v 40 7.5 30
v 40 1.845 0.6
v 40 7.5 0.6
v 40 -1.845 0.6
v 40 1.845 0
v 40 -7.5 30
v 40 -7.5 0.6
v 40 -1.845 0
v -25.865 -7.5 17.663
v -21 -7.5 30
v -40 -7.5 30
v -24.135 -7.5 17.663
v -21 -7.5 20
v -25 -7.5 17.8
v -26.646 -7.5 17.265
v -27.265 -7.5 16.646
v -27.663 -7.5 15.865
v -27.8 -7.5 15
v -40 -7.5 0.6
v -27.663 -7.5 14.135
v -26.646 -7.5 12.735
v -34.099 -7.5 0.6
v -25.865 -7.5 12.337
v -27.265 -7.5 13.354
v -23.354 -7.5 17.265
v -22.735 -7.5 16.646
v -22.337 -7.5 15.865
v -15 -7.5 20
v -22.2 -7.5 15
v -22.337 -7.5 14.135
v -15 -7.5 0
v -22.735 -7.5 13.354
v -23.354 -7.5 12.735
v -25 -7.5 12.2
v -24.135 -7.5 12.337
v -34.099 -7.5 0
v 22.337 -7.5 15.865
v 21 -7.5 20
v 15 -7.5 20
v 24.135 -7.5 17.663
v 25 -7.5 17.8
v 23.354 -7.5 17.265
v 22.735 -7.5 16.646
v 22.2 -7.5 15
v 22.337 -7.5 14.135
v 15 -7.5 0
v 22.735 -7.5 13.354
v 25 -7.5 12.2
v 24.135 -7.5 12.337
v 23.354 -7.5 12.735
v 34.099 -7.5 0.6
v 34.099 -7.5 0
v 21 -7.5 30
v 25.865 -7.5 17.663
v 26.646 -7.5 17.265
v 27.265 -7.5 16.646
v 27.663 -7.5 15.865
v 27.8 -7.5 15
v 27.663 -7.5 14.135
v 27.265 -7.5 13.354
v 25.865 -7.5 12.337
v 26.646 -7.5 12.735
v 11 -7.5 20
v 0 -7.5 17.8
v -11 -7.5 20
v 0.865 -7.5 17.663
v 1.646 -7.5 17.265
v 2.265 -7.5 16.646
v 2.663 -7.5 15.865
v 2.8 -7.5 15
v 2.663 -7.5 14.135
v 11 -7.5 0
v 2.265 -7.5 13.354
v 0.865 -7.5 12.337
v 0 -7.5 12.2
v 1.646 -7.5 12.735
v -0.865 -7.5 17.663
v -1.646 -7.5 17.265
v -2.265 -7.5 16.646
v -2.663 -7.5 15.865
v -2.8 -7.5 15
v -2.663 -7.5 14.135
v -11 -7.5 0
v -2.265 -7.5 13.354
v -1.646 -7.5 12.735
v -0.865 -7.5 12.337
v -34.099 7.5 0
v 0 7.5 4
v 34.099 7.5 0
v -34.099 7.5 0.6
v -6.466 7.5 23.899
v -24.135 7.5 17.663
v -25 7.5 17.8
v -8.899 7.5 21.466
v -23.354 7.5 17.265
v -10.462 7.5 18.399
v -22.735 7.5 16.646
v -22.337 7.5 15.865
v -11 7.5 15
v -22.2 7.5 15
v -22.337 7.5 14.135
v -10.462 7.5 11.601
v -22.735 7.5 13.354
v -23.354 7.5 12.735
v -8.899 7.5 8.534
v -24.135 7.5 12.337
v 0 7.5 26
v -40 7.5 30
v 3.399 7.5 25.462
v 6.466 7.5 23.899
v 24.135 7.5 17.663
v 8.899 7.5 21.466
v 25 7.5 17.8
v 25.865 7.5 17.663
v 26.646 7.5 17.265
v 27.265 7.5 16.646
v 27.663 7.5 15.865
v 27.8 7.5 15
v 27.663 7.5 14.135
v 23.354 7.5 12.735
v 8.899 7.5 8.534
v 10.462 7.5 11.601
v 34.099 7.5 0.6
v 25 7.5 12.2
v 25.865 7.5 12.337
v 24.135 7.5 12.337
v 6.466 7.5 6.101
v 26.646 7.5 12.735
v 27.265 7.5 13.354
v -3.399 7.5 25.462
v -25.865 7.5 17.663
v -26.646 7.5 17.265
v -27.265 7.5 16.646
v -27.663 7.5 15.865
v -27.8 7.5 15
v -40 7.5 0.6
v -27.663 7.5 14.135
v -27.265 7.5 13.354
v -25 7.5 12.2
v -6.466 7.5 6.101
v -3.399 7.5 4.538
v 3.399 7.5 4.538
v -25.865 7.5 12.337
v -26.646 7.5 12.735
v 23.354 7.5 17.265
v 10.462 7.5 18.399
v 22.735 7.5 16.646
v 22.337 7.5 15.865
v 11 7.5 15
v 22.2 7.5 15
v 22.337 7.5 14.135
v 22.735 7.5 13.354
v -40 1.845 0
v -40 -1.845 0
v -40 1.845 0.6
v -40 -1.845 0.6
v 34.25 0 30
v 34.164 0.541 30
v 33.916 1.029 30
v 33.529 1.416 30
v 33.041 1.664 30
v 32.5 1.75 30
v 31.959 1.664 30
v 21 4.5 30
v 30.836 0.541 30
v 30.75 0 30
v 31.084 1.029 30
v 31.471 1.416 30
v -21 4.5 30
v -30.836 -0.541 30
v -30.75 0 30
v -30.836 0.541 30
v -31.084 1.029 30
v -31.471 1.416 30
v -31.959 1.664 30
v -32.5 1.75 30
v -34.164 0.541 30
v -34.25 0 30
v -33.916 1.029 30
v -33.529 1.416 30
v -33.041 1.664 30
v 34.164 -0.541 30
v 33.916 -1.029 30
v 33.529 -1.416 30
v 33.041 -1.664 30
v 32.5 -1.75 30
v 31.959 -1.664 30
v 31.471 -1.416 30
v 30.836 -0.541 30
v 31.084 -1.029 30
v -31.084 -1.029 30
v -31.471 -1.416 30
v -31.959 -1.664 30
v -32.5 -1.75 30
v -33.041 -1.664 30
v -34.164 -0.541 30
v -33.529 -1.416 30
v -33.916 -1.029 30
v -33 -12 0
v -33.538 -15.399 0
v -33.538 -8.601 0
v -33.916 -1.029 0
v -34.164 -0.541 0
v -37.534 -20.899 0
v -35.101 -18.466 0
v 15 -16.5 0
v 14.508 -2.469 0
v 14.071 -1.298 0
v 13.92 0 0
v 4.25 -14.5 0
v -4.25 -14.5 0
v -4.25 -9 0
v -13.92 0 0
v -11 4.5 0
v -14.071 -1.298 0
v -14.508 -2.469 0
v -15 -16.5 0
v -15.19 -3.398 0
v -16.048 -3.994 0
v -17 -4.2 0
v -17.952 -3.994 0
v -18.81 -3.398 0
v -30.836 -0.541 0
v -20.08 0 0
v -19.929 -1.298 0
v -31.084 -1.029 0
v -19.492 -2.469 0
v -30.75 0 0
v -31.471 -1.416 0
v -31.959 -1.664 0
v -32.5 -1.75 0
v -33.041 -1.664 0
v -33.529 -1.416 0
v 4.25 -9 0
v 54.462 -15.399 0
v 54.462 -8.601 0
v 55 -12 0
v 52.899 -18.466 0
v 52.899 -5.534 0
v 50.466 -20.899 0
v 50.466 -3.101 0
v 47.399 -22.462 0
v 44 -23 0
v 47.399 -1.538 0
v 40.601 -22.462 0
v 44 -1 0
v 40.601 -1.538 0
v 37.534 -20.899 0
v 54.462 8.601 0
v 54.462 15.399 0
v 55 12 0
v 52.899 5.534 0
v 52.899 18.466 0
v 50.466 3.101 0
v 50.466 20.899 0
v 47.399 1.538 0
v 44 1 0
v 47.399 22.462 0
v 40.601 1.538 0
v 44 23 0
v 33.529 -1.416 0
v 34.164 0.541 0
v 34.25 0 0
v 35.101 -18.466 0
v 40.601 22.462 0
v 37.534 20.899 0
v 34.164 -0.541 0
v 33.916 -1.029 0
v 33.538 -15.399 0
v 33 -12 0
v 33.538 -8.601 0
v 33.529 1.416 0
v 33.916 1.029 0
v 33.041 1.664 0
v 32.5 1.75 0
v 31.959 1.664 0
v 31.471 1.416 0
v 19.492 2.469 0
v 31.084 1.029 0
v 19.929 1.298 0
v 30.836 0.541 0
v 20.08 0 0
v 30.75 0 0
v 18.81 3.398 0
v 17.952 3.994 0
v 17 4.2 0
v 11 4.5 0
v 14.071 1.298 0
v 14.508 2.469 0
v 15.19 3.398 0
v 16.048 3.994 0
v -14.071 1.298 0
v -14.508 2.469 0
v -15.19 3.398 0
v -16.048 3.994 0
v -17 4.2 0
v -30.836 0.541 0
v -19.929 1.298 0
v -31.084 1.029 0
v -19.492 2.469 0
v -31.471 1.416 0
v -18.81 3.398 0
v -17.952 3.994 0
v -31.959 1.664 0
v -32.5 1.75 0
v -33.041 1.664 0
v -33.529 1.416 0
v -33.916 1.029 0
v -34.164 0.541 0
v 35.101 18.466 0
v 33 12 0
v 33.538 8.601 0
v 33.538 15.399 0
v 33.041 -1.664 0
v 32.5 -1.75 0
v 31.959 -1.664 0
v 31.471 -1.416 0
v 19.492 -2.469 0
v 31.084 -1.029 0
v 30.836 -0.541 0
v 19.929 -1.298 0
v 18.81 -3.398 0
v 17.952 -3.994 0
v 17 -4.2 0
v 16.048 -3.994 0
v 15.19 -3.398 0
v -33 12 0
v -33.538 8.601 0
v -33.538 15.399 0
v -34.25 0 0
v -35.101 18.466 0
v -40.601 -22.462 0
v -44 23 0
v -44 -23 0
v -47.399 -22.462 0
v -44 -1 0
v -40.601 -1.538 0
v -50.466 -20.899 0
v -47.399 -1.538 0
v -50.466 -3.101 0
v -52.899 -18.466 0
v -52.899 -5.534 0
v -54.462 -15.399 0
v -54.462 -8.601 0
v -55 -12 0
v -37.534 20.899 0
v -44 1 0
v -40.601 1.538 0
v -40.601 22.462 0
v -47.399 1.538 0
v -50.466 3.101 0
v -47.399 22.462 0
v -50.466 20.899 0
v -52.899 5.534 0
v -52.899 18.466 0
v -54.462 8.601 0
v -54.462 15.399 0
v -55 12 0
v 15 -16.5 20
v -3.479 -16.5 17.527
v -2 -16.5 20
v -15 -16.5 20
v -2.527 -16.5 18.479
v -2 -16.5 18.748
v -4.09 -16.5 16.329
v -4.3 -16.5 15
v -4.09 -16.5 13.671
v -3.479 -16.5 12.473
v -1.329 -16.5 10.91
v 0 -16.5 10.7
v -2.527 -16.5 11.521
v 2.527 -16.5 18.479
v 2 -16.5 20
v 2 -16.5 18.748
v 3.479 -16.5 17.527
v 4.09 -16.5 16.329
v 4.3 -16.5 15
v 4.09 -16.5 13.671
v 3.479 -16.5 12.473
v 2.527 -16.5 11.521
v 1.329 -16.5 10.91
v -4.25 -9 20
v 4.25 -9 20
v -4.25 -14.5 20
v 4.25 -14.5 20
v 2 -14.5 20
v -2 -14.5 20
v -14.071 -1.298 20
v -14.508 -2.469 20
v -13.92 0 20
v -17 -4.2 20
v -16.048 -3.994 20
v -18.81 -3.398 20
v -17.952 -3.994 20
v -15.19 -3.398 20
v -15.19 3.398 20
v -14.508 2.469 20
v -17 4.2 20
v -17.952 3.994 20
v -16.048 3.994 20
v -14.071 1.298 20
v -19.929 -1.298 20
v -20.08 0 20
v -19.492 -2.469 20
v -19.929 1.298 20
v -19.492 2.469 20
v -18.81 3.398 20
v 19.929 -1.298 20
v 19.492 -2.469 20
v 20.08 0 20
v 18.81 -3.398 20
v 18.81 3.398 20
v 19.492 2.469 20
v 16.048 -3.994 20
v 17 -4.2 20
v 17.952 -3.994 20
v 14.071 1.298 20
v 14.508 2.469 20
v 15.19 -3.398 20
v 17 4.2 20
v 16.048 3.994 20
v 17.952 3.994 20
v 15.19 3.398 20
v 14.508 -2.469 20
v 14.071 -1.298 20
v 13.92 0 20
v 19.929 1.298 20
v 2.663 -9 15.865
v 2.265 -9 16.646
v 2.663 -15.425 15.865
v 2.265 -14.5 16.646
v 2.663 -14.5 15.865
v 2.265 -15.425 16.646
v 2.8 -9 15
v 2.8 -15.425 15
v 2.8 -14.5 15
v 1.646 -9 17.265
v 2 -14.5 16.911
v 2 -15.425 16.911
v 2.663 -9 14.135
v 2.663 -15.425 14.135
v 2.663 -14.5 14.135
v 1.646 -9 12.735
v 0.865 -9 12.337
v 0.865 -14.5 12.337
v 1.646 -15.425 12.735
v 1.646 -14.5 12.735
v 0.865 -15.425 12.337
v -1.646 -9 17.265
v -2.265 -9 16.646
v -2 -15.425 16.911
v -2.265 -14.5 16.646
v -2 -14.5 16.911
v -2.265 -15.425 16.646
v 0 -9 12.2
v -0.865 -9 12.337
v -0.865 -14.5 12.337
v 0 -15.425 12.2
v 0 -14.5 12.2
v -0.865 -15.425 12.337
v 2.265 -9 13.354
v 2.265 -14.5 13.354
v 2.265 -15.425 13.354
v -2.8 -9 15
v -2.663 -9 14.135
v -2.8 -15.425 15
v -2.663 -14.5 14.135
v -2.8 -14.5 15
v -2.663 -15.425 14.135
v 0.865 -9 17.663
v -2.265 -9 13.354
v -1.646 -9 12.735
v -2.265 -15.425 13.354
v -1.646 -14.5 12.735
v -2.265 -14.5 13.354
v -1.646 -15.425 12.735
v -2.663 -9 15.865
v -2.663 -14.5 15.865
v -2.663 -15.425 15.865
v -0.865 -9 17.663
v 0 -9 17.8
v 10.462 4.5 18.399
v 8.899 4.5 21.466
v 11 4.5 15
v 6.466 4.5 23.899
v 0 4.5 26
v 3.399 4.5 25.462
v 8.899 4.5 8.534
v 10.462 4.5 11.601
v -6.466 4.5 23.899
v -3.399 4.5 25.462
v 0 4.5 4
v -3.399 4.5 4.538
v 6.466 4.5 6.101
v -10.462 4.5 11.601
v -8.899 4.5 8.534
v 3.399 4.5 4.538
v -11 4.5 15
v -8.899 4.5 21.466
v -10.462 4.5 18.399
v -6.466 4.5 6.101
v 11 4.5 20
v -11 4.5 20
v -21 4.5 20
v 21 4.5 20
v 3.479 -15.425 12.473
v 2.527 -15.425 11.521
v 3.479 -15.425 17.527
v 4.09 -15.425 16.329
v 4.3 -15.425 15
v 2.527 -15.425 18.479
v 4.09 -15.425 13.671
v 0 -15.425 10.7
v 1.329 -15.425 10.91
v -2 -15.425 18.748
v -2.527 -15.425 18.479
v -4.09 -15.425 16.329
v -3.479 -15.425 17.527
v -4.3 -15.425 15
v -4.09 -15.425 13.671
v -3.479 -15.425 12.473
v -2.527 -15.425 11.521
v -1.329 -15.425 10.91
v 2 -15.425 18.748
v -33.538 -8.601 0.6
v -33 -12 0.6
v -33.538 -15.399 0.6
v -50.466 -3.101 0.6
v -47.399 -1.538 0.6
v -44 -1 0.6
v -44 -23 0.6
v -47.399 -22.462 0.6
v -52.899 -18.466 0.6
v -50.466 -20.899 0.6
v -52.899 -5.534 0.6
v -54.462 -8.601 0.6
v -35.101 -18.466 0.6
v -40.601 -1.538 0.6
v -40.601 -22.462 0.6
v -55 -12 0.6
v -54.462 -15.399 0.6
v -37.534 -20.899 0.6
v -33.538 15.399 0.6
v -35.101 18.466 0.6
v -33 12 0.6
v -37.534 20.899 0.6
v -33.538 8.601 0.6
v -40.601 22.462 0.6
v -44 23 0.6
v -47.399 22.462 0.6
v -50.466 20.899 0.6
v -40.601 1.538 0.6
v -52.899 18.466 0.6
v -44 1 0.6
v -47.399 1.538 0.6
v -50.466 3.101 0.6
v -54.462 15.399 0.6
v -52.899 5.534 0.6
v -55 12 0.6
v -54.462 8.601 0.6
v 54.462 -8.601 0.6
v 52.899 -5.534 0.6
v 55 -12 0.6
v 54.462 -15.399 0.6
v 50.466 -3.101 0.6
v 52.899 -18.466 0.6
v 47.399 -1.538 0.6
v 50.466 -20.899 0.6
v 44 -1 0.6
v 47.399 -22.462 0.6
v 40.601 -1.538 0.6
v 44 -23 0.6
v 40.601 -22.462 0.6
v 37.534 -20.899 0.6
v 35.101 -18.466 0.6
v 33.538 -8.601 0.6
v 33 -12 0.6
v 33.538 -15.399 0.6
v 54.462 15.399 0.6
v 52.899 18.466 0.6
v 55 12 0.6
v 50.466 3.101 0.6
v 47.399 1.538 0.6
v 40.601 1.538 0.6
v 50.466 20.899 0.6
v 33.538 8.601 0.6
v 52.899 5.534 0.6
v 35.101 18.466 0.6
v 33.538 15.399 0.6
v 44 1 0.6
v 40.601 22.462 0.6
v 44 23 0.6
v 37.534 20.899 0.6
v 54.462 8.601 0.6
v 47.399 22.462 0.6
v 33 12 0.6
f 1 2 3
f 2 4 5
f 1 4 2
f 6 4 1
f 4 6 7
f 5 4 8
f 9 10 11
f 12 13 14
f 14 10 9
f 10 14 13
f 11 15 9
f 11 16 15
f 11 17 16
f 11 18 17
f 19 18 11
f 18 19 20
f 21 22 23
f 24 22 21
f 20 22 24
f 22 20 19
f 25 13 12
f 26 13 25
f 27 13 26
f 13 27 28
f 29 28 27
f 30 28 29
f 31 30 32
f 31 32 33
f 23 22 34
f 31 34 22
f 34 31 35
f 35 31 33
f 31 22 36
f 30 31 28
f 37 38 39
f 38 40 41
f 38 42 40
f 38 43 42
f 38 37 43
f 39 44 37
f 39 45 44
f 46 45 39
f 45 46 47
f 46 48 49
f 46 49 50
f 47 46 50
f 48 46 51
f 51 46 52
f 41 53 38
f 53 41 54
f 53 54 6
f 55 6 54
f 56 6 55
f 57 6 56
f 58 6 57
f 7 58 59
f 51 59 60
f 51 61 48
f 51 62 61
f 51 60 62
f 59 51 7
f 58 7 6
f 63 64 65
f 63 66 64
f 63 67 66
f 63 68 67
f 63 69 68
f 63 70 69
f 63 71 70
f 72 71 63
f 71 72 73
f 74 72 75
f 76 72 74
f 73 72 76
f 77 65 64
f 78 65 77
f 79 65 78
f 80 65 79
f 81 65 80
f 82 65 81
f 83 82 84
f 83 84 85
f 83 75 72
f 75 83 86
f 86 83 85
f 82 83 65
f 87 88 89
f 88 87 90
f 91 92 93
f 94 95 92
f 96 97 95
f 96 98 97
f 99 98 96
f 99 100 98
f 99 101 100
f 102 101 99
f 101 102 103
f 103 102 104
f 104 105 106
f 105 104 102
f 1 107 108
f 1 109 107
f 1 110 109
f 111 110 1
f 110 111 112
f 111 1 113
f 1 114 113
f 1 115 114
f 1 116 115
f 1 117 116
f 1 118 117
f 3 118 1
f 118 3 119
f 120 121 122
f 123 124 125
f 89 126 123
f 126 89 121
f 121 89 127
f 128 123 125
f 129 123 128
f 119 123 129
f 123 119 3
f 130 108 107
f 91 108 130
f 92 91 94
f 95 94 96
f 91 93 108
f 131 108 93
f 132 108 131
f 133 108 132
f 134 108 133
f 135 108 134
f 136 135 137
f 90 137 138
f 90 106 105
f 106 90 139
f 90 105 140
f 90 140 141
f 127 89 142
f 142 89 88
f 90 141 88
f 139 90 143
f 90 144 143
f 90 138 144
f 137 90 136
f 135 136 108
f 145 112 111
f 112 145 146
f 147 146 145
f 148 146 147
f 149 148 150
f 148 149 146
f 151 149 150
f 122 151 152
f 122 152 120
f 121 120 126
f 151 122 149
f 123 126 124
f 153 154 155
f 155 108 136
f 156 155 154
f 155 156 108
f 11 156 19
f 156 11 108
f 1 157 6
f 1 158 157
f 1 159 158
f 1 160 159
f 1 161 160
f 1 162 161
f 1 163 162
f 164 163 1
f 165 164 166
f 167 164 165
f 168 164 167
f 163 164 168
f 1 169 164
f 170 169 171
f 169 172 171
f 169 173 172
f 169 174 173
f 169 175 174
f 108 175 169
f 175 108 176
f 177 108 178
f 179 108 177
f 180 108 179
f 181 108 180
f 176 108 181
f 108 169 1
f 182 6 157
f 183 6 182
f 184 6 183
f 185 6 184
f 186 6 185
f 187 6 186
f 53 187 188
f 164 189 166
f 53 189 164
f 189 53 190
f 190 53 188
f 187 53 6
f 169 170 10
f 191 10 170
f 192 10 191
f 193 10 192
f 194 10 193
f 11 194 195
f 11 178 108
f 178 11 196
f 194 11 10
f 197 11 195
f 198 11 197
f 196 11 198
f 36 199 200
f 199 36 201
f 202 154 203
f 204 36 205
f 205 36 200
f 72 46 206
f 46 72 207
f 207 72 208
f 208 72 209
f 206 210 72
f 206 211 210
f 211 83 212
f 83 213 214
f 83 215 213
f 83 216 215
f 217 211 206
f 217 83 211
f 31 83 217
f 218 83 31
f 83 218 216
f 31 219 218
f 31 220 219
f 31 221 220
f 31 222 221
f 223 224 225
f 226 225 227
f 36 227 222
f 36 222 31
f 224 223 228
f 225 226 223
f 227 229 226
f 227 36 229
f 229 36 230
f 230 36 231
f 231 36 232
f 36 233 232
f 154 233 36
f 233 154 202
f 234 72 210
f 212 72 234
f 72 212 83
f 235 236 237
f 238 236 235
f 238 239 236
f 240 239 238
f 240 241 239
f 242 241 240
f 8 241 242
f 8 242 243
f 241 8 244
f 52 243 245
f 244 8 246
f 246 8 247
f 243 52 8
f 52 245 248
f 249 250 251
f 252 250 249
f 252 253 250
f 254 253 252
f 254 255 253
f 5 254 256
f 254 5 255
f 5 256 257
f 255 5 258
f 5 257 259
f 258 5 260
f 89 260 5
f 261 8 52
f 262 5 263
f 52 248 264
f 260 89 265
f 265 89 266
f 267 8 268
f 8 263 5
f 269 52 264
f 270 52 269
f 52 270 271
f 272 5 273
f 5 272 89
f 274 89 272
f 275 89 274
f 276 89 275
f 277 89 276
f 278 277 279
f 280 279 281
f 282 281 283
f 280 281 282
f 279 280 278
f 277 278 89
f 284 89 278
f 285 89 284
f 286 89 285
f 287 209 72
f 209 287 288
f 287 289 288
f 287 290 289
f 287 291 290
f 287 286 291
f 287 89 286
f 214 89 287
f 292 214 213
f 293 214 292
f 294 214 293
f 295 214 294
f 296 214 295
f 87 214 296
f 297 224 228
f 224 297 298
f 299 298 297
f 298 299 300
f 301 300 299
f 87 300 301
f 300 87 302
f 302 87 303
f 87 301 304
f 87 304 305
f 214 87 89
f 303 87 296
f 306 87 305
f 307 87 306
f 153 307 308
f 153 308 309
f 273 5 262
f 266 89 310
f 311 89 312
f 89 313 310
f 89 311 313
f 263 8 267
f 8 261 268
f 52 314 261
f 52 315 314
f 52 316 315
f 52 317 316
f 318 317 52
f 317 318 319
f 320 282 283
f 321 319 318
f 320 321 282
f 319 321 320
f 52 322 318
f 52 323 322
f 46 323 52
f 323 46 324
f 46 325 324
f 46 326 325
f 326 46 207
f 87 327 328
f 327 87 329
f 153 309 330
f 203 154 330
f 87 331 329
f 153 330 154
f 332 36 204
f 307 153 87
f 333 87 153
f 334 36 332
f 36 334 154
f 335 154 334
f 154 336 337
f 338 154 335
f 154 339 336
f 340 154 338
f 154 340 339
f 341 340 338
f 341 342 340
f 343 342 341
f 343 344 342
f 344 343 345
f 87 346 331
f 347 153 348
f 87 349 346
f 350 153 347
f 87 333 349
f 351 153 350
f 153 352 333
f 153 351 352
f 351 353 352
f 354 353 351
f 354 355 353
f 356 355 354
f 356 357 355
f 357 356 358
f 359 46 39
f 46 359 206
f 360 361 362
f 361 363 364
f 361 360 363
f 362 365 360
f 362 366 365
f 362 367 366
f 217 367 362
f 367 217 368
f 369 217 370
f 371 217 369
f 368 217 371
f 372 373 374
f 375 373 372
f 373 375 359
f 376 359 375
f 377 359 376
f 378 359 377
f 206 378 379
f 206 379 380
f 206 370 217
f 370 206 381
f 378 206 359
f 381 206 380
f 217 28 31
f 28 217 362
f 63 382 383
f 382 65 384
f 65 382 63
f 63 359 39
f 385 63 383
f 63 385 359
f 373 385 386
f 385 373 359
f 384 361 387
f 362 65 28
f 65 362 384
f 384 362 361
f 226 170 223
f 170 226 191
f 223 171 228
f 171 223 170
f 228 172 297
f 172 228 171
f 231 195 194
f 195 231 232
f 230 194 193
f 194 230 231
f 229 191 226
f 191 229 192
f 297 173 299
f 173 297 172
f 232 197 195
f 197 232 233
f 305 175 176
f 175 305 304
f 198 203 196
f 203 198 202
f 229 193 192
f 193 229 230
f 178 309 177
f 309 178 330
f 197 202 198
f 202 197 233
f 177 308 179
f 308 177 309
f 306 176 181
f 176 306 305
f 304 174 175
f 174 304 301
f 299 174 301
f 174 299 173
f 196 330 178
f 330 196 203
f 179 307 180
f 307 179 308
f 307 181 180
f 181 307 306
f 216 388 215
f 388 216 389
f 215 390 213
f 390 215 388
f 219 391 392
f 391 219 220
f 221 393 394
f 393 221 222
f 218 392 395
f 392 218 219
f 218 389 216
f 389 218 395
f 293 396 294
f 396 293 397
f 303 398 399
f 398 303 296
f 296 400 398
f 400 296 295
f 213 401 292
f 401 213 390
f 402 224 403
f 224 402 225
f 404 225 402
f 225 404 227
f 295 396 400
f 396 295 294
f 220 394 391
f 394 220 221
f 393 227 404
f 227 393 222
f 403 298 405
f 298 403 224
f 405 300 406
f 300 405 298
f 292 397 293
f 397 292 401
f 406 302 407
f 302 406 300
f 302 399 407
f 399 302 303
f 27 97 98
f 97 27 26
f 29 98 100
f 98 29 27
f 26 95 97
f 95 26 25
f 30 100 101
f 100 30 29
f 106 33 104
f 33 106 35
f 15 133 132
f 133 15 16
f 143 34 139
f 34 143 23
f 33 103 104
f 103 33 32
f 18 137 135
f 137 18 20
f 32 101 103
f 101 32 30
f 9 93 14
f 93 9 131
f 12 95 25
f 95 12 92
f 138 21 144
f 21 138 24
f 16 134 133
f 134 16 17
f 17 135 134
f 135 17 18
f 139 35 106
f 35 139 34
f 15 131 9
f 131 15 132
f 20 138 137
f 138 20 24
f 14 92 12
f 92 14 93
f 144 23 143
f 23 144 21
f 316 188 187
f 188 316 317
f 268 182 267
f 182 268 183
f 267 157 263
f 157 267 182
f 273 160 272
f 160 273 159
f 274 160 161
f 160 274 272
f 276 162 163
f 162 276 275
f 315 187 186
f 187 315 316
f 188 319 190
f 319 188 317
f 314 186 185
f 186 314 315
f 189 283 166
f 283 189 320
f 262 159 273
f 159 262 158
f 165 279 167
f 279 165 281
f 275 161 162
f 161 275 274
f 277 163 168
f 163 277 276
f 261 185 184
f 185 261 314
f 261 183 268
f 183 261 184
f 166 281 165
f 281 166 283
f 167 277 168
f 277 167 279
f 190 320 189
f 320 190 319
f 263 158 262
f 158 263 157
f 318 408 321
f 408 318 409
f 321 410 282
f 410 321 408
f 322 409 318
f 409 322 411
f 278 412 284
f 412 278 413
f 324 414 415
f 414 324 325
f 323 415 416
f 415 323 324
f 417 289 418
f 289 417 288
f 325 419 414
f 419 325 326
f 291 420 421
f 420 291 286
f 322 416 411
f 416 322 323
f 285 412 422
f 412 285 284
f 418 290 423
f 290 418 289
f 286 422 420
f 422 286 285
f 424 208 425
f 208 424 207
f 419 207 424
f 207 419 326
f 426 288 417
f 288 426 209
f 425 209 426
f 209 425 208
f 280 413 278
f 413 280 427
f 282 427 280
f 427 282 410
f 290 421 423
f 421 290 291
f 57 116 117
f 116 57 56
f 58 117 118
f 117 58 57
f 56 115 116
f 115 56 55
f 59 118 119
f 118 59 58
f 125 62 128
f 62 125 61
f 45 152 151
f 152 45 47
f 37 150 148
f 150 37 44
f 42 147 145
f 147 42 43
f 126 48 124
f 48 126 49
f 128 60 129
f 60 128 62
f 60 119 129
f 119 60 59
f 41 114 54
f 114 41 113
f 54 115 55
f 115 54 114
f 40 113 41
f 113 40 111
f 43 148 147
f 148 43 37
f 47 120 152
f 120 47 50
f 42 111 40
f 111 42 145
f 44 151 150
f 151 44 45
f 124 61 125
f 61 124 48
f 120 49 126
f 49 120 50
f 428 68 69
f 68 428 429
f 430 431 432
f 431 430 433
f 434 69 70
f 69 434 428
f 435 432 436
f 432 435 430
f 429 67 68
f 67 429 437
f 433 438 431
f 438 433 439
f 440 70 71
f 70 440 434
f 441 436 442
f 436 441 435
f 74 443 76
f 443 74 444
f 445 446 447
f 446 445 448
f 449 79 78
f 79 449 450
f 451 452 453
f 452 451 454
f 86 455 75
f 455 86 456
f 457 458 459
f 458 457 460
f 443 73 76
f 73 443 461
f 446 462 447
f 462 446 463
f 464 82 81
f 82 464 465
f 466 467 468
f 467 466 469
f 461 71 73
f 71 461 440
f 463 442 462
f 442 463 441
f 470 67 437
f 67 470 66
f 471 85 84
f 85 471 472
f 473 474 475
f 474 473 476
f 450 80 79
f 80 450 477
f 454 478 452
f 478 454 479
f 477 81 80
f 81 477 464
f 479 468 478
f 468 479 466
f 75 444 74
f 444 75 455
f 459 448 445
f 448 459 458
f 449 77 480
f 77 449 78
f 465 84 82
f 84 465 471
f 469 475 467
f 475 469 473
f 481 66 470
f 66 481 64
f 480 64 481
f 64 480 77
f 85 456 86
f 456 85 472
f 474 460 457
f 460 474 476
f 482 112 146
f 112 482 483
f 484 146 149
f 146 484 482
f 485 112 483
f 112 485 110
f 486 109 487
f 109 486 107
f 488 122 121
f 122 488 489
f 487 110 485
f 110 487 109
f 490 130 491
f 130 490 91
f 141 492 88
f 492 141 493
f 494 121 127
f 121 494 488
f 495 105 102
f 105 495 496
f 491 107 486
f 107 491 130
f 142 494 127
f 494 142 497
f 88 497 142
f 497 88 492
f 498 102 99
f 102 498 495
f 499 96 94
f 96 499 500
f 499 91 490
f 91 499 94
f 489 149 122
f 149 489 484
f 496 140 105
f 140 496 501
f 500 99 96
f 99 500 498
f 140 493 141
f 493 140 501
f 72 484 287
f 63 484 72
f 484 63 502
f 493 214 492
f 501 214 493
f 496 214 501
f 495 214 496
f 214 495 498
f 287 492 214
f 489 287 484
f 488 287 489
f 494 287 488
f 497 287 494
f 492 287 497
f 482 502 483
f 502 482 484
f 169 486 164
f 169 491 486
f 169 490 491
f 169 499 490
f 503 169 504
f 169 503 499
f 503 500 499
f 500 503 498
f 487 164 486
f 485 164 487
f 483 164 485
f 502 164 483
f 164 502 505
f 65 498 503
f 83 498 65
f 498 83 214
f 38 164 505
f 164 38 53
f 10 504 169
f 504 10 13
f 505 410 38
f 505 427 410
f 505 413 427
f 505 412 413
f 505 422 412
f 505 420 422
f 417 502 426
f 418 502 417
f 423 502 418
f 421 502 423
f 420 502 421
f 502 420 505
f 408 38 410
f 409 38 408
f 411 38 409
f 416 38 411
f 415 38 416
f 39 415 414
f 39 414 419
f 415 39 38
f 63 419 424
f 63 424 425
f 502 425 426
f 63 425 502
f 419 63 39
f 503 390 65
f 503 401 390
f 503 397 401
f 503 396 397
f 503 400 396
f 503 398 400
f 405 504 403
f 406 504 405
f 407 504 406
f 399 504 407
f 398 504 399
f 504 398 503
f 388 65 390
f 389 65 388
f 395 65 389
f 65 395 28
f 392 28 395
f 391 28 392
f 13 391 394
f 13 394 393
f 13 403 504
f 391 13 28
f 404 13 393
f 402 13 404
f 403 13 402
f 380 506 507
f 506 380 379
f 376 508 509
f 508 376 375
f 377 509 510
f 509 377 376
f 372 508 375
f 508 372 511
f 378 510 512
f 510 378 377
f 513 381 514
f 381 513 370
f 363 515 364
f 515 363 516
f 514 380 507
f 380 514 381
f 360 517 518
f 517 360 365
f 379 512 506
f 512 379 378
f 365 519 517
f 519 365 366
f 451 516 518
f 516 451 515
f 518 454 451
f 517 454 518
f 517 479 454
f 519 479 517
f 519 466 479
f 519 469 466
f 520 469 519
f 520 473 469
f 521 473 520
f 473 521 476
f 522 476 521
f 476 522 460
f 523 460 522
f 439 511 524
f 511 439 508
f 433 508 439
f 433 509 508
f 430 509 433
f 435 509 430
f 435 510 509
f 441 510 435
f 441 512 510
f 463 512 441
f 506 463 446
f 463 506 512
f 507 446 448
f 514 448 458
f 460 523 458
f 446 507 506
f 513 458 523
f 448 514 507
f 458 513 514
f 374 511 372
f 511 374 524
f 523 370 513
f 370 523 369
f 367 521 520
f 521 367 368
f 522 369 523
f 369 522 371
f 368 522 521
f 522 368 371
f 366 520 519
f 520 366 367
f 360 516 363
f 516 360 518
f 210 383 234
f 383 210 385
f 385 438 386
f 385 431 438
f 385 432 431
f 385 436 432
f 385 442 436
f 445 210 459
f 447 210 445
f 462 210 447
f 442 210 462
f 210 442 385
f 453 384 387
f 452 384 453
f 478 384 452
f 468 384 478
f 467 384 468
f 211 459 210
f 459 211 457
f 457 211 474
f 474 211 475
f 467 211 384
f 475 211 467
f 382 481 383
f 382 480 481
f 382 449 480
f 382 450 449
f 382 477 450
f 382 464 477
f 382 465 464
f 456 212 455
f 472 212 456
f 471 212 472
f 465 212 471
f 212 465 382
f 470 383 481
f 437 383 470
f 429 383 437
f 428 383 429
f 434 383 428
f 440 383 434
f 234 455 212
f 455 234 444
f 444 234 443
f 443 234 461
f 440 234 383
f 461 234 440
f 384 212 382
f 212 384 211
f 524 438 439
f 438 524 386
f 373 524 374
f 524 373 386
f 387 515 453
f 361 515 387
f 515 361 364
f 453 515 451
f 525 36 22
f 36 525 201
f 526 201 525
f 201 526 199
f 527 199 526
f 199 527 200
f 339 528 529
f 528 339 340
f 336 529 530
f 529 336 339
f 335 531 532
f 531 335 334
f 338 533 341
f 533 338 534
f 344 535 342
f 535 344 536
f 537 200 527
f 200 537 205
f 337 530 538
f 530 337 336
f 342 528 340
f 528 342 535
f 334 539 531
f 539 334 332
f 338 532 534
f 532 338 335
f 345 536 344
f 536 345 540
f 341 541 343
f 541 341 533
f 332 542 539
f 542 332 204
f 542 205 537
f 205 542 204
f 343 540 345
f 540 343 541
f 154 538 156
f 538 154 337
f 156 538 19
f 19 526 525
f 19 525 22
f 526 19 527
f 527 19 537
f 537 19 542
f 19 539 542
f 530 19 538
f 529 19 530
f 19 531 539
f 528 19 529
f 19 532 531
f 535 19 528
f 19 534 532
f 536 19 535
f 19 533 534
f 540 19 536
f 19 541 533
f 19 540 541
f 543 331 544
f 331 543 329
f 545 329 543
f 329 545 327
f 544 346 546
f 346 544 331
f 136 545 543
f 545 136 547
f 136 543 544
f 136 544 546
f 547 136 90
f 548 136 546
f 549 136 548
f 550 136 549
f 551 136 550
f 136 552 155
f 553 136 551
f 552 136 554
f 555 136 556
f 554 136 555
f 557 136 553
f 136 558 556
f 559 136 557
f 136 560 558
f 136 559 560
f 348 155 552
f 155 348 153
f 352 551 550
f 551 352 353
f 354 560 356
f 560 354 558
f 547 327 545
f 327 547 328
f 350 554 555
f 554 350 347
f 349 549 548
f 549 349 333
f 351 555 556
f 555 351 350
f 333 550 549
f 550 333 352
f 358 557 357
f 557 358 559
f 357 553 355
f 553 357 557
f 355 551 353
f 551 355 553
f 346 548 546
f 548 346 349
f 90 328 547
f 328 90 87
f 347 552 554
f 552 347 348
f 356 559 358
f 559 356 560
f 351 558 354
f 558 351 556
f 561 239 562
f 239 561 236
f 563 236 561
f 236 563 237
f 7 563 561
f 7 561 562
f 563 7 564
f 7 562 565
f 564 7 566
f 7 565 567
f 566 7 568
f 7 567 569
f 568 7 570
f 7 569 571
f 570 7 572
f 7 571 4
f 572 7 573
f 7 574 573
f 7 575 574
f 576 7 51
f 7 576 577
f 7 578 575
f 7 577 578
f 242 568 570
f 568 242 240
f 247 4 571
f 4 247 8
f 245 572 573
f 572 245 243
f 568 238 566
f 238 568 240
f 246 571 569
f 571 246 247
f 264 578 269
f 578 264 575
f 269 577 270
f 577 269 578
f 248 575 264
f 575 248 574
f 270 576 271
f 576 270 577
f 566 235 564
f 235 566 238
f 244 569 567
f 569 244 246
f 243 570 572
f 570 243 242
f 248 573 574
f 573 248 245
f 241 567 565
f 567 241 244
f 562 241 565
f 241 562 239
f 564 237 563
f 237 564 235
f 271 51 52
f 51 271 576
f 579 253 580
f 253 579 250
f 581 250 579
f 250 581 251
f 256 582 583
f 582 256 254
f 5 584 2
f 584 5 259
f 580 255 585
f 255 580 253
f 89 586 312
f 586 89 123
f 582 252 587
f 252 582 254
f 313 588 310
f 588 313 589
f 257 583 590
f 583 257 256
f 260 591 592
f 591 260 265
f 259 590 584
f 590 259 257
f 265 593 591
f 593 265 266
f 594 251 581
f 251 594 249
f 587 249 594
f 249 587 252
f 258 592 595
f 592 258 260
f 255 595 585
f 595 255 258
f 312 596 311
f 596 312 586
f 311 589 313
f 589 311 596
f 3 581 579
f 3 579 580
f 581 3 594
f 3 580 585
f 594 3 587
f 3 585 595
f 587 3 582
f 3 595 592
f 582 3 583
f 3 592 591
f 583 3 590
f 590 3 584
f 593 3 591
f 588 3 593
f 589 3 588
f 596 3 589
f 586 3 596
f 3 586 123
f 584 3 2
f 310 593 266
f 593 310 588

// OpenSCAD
/**
 * hotend support
 */

m3Rad = 3.5/2;
m5Rad = 5.6/2;
toCarrDist= 65;
toHotDist= 50;
holeRad=11;
boxH=15;

/**
 *
 */
module helperDisk(diameter) {
	cylinder(r = diameter/2, h = 0.6, $fn=20);
}

union(){

translate([0,0,15])
rotate([90,0,0])
difference(){

union(){
cube(size=[80,30,boxH],center=true);
translate([0,-5,boxH/2+4.5]) cube(size=[holeRad*2+8,20,9],center=true);
}

for(i=[-1,1]){
translate([i*toCarrDist/2,0,0]) rotate([90,0,0]) cylinder(r=m3Rad,h=50,center=true,$fn=20);
translate([i*17,0,0]) rotate([90,0,0]) scale([1.1,1.5,1]) cylinder(r=m5Rad,h=50,center=true,$fn=20);
translate([i*toHotDist/2,0,0]) cylinder(r=m5Rad,h=50,center=true,$fn=20);
}

cylinder(r=m5Rad,h=50,center=true,$fn=20);
cylinder(r=holeRad,h=15,center=true,$fn=20);
translate([0,0,1.5]) cube(size=[holeRad*2,50,boxH-3],center=true);
translate([0,10,1.5]) cube(size=[holeRad*2+20,10,boxH-3],center=true);


//nut pocket
translate([0,0,boxH+1]) cylinder(r=4.3,h=1.15,center=true,$fn=20);
translate([0,0,boxH-3.25]) cube(size=[8.5,50,5.5],center=true);
translate([0,5,boxH+1]) cube(size=[4,7,3],center=true);

}//diff

for(i=[-1,1]) for(j=[-1,1]) translate([i*44,j*12,0]) helperDisk(22);

}
